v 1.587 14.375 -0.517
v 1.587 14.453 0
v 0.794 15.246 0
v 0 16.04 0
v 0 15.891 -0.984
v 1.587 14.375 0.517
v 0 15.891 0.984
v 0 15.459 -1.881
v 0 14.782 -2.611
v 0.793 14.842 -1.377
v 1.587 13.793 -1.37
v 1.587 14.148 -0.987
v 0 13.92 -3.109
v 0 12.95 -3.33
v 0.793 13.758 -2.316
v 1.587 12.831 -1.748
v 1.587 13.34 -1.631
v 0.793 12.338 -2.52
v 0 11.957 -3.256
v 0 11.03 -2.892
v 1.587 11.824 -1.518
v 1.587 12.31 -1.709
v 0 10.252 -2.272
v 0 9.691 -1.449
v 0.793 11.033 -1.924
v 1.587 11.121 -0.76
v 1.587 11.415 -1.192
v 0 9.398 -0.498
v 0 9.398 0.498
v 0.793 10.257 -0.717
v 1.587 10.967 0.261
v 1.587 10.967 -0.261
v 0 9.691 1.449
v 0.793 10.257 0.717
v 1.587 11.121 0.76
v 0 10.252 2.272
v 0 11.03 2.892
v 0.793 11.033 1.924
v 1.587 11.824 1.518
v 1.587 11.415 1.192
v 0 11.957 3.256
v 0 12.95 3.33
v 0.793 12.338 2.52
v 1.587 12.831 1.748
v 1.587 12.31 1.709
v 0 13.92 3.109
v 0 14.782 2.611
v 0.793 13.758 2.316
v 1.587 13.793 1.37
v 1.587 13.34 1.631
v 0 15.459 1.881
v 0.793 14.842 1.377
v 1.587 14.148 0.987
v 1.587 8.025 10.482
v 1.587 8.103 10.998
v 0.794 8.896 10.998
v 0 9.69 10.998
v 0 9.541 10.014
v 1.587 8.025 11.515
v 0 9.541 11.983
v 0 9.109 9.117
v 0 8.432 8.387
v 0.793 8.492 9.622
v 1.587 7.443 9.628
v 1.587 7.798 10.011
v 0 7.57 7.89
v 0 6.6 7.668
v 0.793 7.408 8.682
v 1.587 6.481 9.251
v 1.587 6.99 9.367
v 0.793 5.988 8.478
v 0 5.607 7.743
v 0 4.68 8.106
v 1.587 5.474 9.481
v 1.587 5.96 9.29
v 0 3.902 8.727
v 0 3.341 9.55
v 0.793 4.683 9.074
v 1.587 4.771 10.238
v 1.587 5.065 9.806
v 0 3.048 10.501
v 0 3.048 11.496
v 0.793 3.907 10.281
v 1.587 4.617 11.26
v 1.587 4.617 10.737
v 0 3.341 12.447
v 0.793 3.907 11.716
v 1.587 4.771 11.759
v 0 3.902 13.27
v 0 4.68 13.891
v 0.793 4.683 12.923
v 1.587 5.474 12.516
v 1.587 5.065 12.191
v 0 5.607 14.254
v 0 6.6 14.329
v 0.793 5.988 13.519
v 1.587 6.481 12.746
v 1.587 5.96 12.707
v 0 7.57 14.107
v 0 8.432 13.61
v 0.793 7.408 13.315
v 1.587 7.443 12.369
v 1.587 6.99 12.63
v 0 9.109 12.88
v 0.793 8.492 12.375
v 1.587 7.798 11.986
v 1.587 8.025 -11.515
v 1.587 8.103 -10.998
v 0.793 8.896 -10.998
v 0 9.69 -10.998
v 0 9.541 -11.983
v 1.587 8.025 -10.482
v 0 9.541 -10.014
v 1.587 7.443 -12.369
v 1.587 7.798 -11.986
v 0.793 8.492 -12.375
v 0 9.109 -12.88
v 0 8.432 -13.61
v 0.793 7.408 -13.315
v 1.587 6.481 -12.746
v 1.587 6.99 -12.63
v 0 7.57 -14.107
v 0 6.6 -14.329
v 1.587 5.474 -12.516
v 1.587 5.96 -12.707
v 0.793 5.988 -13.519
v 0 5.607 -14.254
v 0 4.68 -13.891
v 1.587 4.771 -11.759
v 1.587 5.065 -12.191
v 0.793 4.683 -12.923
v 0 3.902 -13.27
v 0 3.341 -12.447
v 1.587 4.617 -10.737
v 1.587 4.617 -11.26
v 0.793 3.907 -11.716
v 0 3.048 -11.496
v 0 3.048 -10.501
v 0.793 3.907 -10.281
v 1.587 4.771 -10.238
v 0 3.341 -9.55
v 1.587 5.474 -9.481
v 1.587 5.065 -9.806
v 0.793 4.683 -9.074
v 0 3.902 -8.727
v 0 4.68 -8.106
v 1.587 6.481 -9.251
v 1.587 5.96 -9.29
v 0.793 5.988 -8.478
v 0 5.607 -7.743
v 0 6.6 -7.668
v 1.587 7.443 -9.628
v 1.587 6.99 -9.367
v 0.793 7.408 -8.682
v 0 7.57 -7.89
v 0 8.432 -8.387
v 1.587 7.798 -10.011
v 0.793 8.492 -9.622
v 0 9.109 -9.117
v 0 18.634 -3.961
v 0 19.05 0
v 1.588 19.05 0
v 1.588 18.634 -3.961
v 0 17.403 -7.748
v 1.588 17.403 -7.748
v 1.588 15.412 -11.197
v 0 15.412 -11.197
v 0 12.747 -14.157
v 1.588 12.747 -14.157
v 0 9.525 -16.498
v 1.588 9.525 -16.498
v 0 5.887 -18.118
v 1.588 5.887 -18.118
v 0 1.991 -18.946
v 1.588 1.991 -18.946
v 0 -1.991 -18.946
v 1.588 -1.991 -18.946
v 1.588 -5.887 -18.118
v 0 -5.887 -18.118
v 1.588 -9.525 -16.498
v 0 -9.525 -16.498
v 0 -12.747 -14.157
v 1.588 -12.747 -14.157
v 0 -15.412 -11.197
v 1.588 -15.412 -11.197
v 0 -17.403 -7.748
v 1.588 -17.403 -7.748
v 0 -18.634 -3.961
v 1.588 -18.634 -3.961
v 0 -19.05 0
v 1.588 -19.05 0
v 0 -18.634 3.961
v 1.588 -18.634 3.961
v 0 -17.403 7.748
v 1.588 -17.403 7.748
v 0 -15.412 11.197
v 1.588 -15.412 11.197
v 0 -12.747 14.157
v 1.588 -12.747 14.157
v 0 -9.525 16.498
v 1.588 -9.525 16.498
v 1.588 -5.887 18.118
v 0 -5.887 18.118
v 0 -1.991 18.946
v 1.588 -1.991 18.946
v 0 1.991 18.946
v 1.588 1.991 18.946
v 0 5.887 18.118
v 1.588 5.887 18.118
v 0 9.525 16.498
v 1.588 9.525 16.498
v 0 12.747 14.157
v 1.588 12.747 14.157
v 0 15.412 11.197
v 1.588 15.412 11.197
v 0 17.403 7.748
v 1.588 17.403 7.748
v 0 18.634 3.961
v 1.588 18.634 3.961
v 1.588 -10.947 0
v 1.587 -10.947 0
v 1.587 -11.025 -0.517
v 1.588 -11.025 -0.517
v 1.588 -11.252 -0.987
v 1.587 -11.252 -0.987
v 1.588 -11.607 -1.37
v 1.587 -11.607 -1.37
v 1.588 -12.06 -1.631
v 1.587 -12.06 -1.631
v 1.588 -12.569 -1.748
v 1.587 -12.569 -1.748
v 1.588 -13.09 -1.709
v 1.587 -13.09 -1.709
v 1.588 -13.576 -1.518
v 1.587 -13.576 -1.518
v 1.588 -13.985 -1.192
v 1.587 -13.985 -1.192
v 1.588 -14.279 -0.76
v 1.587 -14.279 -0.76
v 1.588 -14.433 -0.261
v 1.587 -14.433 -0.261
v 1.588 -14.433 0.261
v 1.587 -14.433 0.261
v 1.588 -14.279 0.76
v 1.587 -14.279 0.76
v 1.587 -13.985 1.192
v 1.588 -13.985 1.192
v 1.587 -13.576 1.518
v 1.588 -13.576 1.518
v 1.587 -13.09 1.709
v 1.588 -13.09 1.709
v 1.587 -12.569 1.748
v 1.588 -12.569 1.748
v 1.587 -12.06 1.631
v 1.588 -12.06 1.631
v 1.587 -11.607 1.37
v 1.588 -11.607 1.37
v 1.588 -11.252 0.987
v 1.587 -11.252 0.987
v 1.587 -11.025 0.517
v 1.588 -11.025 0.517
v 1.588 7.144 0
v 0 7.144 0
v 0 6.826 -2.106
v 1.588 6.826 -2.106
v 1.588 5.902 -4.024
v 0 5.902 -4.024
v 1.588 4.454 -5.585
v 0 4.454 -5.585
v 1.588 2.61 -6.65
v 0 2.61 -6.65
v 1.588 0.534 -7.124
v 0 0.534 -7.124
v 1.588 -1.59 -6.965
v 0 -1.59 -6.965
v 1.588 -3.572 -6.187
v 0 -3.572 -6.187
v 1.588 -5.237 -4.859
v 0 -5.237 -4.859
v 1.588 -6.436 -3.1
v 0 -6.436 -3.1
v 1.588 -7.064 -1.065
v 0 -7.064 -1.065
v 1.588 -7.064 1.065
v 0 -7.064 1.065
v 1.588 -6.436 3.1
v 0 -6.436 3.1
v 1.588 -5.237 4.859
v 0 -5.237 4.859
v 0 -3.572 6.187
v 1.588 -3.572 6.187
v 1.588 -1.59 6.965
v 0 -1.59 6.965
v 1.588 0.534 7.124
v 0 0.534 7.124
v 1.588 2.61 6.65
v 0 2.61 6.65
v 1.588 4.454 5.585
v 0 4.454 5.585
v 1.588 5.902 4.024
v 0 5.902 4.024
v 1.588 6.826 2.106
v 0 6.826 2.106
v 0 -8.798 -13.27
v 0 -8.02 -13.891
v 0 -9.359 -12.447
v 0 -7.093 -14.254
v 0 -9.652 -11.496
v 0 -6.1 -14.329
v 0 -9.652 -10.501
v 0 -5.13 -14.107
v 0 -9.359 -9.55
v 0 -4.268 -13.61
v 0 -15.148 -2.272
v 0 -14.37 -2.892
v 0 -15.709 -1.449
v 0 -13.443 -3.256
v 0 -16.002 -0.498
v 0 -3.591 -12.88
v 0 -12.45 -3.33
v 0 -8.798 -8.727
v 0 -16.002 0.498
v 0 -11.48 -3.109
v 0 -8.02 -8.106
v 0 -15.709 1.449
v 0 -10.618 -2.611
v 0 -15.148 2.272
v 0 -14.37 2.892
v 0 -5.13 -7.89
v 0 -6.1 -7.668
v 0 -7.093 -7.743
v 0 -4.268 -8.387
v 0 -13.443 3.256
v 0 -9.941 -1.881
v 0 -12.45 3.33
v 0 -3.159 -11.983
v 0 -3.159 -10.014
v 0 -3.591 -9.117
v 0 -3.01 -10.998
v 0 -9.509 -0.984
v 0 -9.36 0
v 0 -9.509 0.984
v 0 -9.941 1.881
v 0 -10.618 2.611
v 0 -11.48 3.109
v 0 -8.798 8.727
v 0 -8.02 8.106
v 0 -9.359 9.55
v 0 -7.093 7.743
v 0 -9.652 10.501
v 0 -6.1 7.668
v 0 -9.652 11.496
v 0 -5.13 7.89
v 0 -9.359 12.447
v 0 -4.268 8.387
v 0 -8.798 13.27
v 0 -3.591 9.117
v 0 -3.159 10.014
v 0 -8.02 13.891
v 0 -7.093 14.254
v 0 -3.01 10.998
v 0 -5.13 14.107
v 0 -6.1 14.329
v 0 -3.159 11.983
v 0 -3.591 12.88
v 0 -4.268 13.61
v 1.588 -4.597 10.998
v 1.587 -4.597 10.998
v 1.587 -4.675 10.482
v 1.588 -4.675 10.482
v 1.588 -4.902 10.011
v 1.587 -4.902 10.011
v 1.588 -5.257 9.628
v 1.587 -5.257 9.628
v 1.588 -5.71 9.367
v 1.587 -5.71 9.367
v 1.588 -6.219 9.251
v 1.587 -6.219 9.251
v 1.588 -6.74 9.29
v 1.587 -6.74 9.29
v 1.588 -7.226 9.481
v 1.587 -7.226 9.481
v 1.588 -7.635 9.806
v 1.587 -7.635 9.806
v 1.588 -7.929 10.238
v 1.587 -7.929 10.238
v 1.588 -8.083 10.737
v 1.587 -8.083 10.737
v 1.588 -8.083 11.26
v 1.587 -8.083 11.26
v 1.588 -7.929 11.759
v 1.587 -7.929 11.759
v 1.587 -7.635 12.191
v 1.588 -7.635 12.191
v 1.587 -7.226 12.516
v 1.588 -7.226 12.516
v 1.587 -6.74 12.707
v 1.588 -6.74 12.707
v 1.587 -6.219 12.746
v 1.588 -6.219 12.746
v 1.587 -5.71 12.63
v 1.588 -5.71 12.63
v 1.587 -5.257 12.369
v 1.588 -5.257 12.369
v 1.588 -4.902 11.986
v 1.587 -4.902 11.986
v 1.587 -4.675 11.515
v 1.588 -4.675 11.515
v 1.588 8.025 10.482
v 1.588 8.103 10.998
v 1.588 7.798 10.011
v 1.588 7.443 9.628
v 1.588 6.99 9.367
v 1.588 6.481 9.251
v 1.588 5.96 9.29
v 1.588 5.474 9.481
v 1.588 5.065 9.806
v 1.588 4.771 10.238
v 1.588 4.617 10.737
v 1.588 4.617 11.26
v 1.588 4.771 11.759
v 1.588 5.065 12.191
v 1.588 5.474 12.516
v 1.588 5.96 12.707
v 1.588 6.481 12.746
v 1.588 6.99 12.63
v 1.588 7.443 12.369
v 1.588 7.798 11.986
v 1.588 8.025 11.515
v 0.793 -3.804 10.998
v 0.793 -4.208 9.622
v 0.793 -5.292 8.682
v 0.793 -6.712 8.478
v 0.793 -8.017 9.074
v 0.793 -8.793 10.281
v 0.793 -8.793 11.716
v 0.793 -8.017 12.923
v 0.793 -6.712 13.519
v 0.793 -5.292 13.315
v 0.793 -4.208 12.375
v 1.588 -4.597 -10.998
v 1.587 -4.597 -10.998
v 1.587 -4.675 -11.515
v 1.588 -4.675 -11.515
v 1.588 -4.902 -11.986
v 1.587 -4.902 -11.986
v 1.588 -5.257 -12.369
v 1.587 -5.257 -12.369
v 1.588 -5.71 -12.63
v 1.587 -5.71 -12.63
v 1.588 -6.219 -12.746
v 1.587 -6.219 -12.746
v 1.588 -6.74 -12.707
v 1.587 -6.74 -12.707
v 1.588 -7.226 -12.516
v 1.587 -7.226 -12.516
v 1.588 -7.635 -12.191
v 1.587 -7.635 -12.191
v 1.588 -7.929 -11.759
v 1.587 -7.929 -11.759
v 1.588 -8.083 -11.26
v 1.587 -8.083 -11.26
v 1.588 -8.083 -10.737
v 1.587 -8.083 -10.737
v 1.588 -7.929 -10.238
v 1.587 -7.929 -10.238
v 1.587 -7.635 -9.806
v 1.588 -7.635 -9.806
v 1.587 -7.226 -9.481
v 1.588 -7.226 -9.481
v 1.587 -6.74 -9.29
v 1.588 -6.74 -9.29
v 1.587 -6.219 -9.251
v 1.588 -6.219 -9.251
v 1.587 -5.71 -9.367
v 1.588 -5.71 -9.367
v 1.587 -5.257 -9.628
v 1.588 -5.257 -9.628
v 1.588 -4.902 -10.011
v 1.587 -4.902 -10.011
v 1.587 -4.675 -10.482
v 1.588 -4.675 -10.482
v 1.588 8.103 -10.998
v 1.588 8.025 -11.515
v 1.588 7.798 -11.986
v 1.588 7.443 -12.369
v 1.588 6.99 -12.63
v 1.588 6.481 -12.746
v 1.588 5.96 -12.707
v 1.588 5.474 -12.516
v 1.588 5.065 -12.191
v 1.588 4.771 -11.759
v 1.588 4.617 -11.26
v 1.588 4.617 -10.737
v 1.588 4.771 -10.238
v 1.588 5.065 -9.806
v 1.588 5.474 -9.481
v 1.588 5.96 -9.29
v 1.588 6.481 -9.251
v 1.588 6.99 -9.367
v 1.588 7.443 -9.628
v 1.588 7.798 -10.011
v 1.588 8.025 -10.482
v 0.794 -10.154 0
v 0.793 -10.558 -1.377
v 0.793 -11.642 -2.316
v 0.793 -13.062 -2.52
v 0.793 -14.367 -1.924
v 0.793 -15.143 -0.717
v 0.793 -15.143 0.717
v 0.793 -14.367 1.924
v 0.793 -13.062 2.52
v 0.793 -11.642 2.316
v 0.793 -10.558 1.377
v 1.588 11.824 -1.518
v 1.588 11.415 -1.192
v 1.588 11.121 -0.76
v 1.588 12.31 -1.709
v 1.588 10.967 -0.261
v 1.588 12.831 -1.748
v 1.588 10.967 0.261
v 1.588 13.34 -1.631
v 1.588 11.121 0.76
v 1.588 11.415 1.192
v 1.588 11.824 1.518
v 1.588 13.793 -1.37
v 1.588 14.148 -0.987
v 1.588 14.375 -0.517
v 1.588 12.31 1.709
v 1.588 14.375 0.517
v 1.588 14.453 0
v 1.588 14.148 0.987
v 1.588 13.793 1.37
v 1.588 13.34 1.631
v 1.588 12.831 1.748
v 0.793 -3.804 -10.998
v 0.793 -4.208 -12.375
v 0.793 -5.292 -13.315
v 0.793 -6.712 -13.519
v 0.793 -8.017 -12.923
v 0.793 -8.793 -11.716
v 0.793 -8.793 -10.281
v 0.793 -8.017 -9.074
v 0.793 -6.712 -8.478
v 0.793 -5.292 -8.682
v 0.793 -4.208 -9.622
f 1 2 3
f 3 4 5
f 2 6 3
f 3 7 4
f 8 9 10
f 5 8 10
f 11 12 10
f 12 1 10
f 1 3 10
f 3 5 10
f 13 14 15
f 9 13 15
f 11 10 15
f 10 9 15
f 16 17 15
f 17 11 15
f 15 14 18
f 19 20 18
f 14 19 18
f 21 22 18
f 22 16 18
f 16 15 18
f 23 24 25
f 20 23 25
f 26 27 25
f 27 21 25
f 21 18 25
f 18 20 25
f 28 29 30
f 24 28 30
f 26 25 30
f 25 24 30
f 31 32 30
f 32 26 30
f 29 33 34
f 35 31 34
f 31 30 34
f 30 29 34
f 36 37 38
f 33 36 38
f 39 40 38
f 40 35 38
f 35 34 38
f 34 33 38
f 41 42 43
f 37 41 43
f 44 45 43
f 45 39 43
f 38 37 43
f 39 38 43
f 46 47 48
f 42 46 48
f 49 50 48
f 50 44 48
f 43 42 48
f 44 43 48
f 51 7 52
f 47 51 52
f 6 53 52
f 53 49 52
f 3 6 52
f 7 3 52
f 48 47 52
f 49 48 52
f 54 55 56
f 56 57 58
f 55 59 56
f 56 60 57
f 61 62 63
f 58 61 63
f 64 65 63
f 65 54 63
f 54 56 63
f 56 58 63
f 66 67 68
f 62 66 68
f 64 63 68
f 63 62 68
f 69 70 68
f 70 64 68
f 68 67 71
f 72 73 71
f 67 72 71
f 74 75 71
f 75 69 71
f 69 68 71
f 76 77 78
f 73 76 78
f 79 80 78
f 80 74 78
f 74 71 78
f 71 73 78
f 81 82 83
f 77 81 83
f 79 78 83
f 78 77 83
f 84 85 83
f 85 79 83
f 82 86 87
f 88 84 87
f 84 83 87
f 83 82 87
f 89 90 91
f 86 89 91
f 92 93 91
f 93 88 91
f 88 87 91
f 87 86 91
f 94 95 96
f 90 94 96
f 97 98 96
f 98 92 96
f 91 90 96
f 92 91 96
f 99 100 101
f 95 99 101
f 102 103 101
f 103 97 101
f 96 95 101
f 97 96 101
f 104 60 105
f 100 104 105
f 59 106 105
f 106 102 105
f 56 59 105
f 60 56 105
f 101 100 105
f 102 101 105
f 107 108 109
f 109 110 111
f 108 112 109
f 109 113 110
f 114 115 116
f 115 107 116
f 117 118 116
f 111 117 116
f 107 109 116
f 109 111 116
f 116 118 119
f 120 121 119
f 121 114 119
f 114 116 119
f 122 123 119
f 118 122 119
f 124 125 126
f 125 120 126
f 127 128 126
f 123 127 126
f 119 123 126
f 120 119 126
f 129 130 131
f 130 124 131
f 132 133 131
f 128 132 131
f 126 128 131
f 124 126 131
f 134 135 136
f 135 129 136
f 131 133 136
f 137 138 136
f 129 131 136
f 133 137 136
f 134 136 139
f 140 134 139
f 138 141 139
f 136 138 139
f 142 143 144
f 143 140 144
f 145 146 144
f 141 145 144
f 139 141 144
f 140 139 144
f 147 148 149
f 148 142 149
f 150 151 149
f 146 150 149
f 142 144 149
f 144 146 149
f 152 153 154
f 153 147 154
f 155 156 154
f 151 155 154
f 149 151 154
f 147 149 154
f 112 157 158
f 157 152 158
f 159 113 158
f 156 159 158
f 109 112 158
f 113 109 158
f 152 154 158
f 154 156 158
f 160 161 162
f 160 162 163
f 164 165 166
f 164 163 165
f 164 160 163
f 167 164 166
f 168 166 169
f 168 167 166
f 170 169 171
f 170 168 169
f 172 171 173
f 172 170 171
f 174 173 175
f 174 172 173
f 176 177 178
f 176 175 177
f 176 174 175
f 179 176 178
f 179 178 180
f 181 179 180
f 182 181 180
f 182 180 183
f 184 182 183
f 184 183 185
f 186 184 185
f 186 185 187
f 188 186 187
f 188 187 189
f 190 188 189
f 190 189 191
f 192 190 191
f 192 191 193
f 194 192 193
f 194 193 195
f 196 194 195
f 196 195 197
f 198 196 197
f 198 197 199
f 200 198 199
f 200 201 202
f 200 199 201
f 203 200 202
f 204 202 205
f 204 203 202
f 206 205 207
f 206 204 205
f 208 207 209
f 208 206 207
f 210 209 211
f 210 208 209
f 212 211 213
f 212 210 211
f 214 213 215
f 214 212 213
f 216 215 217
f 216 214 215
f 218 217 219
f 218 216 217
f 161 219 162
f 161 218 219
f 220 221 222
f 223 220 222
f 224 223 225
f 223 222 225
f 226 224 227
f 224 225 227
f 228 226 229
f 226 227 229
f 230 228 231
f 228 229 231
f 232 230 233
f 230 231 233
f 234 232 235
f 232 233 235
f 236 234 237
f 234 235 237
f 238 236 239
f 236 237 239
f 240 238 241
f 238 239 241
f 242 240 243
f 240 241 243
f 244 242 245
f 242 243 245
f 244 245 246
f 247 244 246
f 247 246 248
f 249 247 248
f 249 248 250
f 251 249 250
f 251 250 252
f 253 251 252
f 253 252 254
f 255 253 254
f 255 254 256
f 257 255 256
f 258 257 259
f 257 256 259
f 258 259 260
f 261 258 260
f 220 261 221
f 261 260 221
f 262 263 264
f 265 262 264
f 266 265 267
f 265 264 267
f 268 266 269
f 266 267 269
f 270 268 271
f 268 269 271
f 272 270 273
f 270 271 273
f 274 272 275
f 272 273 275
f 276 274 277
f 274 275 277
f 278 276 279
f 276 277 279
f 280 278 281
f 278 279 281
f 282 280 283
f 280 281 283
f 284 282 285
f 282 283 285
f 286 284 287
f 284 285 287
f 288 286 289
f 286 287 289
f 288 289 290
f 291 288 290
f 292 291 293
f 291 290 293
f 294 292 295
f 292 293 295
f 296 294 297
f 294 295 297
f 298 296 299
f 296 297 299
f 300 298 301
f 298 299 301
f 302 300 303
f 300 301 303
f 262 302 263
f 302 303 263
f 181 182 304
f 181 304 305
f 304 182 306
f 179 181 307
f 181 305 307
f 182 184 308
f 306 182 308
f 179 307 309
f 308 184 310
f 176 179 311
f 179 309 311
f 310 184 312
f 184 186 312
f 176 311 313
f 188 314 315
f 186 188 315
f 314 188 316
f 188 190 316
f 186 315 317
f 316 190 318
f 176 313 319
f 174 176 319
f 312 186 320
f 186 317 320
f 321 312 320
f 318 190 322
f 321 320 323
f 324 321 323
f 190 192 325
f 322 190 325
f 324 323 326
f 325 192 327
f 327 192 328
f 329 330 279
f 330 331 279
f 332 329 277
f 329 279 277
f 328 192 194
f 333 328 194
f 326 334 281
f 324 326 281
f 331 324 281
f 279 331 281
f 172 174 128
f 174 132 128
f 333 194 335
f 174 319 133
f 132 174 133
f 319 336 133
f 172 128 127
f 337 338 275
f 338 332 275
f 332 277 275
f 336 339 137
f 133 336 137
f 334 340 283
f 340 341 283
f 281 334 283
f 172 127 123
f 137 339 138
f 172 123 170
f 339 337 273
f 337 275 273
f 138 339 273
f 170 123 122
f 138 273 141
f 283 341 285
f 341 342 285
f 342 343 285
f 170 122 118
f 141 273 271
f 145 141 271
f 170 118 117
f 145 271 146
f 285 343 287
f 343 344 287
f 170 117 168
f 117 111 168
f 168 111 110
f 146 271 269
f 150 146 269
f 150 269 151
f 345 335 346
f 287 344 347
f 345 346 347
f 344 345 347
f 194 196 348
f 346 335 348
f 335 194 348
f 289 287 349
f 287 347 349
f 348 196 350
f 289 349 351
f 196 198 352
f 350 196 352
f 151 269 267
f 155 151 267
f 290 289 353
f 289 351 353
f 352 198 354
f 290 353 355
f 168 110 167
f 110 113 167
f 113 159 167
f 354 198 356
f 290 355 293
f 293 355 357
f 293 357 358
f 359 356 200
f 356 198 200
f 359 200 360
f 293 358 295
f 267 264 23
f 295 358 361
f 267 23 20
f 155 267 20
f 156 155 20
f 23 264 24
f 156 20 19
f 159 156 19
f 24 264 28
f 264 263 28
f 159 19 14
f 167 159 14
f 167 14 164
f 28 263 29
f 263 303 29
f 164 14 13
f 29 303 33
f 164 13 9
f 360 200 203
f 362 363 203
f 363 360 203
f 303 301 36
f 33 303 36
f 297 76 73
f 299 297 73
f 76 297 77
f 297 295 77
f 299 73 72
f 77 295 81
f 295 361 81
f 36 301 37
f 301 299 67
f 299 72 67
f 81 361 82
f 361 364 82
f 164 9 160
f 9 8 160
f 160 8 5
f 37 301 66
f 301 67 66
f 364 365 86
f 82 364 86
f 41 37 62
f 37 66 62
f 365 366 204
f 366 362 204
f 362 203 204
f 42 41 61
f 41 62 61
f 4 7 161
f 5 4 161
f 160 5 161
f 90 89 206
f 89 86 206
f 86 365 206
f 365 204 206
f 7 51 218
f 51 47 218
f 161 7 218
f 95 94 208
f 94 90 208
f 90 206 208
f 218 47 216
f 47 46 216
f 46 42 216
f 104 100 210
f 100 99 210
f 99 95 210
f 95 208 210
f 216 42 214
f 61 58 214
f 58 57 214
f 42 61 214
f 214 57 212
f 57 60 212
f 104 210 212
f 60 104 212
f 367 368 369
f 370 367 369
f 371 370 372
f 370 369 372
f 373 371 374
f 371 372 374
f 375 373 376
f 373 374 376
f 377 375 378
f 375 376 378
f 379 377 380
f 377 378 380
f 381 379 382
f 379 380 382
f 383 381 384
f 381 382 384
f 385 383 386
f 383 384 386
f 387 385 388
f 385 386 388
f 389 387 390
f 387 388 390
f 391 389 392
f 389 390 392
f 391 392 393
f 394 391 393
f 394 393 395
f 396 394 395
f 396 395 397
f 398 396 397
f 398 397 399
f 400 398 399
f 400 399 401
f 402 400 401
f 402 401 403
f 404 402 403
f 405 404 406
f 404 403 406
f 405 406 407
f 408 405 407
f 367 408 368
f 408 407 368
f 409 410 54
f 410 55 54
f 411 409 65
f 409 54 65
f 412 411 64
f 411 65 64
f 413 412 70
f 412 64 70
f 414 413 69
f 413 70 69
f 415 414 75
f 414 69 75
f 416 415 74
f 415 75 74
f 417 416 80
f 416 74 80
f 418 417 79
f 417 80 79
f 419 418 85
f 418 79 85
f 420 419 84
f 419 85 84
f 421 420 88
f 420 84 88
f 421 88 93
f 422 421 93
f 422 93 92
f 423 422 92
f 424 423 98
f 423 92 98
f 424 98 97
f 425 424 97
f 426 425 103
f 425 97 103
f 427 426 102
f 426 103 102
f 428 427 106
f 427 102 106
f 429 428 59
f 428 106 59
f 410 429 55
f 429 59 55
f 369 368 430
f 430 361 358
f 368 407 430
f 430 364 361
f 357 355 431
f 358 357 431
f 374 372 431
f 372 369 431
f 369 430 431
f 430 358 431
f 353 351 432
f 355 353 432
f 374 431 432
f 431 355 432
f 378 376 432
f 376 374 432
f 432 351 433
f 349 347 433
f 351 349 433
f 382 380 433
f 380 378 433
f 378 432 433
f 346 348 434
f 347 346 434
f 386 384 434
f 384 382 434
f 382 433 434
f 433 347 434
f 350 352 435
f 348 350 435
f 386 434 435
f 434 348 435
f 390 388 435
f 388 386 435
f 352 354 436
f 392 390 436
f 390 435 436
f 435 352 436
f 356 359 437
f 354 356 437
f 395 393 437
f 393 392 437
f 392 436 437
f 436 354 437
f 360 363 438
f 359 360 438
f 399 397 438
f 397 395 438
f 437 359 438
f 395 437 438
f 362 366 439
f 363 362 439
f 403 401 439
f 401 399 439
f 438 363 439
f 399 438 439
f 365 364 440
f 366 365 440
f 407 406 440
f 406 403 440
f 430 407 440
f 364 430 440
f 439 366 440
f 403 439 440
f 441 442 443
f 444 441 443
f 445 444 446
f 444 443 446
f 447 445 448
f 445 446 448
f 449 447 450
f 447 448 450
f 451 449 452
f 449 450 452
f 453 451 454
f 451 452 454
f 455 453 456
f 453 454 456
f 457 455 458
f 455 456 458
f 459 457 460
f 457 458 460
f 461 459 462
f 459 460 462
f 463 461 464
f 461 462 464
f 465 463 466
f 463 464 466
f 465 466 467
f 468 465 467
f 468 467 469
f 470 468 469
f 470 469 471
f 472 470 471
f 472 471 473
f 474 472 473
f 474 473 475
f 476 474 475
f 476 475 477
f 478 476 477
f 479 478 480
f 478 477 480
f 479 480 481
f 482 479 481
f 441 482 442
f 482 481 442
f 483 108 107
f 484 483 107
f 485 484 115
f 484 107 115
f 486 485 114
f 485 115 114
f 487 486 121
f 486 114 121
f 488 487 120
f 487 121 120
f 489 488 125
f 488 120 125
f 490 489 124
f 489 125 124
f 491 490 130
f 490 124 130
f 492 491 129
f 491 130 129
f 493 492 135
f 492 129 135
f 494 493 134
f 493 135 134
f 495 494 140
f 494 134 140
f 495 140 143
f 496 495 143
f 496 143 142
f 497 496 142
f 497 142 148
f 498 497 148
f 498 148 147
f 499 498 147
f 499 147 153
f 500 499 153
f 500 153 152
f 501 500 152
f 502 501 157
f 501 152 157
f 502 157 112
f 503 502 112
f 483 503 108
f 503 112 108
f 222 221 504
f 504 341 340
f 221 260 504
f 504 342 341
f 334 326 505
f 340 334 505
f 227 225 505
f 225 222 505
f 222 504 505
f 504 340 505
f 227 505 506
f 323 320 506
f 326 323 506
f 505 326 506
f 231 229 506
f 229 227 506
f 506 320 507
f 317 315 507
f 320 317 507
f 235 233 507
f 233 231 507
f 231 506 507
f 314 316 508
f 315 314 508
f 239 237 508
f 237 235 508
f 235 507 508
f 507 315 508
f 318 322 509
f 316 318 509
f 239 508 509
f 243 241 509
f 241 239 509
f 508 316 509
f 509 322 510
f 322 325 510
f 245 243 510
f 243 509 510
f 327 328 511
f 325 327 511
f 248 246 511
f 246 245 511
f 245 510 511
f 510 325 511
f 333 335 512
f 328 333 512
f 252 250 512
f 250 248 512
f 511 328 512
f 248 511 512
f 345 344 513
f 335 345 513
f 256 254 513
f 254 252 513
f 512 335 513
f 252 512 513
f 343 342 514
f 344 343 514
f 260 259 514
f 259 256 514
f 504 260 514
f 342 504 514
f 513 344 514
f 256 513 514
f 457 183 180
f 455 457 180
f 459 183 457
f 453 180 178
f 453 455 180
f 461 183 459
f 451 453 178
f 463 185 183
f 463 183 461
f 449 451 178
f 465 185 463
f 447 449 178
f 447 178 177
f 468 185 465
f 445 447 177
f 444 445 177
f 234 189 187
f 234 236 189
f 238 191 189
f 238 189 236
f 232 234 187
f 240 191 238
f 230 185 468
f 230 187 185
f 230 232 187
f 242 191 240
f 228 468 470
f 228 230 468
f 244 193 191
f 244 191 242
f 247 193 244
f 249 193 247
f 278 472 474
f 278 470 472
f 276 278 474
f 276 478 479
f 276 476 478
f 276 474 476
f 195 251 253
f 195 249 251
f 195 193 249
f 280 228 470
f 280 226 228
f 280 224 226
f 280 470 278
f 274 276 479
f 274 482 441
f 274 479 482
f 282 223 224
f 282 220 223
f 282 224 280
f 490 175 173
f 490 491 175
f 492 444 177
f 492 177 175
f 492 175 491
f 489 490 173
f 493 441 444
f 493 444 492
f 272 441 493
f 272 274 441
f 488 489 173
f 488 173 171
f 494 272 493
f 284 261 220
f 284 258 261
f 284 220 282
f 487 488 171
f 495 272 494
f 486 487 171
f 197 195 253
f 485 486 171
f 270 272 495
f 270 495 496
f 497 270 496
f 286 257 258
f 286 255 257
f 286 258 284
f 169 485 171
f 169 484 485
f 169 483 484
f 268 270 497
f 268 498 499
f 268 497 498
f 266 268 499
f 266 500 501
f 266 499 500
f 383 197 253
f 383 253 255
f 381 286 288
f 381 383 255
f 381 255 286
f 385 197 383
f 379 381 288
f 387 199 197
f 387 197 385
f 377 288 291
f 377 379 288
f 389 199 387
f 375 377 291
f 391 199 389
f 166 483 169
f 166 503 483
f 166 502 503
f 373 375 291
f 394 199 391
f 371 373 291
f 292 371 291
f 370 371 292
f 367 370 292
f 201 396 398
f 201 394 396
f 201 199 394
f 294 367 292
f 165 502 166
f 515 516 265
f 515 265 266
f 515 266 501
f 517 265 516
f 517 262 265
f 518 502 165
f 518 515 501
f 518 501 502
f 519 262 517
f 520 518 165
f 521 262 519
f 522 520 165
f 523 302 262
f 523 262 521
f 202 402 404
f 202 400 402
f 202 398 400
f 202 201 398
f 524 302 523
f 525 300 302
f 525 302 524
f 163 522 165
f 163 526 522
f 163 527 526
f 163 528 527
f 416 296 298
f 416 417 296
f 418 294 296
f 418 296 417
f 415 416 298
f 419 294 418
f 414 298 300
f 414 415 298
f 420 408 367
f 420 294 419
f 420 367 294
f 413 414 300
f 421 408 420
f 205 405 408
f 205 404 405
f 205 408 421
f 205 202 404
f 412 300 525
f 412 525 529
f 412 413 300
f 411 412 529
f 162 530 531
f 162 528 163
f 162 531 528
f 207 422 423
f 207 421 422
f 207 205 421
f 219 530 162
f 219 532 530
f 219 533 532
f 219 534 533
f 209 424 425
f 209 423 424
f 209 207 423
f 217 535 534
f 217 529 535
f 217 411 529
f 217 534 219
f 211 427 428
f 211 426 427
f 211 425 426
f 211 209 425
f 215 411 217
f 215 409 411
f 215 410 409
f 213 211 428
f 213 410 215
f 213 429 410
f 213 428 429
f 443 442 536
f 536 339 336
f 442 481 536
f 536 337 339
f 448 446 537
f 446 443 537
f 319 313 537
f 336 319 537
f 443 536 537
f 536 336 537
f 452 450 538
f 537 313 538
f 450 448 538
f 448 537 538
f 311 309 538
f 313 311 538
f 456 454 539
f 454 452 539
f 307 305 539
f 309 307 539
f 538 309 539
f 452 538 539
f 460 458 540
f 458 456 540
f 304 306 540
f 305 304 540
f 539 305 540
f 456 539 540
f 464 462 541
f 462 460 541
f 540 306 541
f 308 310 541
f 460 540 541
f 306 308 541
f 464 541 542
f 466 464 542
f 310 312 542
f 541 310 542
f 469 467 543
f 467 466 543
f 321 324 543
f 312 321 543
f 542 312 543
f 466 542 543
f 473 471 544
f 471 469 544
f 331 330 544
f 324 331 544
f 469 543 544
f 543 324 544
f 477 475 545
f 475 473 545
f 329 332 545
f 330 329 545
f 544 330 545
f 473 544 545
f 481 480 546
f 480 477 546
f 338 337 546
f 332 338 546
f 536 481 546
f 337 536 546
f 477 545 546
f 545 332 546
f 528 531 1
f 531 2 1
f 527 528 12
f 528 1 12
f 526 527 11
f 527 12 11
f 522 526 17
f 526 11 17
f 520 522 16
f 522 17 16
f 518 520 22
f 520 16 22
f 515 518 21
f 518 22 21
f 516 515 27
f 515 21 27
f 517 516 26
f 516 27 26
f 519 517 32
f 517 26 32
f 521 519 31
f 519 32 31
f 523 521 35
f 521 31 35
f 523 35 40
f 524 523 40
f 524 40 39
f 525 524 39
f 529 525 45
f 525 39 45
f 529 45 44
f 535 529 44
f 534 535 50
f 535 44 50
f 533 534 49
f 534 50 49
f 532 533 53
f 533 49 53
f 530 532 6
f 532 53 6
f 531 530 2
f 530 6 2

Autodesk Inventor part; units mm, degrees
ref_plane "YZ Plane" through (0, 0, 0) normal (1, 0, 0) x (0, 1, 0)
ref_plane "XZ Plane" through (0, 0, 0) normal (0, 1, 0) x (-1, 0, 0)
ref_plane "XY Plane" through (0, 0, 0) normal (0, 0, 1) x (1, 0, 0)
sketch "Sketch1" plane through (0, 0, 0) normal (1, 0, 0) x (0, 1, 0)
  circle A0 centre (0, 0) radius 7.1437
  circle A1 centre (0, 0) radius 19.05
  circle A2 centre (12.7, 0) radius 1.7526
  circle A3 centre (6.35, 10.9985) radius 1.7526
  circle A4 centre (-6.35, 10.9985) radius 1.7526
  circle A5 centre (-12.7, 0) radius 1.7526
  circle A6 centre (-6.35, -10.9985) radius 1.7526
  circle A7 centre (6.35, -10.9985) radius 1.7526
  dimension "d0" = 14.2875
  dimension "d1" = 38.1
  dimension "d4" = 3.5052
  dimension "d5" = 12.7
  dimension "d8" = 360
extrude "Extrusion1" add sketch "Sketch1" along normal blind 1.5875
chamfer "Chamfer1" distance 1.5875 angle 45 6 edges at (0, 10.9474, 0) (0, 4.5974, 10.9985) (0, -14.4526, 0) (0, -8.1026, 10.9985) (0, 4.5974, -10.9985) (0, -8.1026, -10.9985)
properties part number "Spacer 3-8x .125" material "UHMW, Black"
